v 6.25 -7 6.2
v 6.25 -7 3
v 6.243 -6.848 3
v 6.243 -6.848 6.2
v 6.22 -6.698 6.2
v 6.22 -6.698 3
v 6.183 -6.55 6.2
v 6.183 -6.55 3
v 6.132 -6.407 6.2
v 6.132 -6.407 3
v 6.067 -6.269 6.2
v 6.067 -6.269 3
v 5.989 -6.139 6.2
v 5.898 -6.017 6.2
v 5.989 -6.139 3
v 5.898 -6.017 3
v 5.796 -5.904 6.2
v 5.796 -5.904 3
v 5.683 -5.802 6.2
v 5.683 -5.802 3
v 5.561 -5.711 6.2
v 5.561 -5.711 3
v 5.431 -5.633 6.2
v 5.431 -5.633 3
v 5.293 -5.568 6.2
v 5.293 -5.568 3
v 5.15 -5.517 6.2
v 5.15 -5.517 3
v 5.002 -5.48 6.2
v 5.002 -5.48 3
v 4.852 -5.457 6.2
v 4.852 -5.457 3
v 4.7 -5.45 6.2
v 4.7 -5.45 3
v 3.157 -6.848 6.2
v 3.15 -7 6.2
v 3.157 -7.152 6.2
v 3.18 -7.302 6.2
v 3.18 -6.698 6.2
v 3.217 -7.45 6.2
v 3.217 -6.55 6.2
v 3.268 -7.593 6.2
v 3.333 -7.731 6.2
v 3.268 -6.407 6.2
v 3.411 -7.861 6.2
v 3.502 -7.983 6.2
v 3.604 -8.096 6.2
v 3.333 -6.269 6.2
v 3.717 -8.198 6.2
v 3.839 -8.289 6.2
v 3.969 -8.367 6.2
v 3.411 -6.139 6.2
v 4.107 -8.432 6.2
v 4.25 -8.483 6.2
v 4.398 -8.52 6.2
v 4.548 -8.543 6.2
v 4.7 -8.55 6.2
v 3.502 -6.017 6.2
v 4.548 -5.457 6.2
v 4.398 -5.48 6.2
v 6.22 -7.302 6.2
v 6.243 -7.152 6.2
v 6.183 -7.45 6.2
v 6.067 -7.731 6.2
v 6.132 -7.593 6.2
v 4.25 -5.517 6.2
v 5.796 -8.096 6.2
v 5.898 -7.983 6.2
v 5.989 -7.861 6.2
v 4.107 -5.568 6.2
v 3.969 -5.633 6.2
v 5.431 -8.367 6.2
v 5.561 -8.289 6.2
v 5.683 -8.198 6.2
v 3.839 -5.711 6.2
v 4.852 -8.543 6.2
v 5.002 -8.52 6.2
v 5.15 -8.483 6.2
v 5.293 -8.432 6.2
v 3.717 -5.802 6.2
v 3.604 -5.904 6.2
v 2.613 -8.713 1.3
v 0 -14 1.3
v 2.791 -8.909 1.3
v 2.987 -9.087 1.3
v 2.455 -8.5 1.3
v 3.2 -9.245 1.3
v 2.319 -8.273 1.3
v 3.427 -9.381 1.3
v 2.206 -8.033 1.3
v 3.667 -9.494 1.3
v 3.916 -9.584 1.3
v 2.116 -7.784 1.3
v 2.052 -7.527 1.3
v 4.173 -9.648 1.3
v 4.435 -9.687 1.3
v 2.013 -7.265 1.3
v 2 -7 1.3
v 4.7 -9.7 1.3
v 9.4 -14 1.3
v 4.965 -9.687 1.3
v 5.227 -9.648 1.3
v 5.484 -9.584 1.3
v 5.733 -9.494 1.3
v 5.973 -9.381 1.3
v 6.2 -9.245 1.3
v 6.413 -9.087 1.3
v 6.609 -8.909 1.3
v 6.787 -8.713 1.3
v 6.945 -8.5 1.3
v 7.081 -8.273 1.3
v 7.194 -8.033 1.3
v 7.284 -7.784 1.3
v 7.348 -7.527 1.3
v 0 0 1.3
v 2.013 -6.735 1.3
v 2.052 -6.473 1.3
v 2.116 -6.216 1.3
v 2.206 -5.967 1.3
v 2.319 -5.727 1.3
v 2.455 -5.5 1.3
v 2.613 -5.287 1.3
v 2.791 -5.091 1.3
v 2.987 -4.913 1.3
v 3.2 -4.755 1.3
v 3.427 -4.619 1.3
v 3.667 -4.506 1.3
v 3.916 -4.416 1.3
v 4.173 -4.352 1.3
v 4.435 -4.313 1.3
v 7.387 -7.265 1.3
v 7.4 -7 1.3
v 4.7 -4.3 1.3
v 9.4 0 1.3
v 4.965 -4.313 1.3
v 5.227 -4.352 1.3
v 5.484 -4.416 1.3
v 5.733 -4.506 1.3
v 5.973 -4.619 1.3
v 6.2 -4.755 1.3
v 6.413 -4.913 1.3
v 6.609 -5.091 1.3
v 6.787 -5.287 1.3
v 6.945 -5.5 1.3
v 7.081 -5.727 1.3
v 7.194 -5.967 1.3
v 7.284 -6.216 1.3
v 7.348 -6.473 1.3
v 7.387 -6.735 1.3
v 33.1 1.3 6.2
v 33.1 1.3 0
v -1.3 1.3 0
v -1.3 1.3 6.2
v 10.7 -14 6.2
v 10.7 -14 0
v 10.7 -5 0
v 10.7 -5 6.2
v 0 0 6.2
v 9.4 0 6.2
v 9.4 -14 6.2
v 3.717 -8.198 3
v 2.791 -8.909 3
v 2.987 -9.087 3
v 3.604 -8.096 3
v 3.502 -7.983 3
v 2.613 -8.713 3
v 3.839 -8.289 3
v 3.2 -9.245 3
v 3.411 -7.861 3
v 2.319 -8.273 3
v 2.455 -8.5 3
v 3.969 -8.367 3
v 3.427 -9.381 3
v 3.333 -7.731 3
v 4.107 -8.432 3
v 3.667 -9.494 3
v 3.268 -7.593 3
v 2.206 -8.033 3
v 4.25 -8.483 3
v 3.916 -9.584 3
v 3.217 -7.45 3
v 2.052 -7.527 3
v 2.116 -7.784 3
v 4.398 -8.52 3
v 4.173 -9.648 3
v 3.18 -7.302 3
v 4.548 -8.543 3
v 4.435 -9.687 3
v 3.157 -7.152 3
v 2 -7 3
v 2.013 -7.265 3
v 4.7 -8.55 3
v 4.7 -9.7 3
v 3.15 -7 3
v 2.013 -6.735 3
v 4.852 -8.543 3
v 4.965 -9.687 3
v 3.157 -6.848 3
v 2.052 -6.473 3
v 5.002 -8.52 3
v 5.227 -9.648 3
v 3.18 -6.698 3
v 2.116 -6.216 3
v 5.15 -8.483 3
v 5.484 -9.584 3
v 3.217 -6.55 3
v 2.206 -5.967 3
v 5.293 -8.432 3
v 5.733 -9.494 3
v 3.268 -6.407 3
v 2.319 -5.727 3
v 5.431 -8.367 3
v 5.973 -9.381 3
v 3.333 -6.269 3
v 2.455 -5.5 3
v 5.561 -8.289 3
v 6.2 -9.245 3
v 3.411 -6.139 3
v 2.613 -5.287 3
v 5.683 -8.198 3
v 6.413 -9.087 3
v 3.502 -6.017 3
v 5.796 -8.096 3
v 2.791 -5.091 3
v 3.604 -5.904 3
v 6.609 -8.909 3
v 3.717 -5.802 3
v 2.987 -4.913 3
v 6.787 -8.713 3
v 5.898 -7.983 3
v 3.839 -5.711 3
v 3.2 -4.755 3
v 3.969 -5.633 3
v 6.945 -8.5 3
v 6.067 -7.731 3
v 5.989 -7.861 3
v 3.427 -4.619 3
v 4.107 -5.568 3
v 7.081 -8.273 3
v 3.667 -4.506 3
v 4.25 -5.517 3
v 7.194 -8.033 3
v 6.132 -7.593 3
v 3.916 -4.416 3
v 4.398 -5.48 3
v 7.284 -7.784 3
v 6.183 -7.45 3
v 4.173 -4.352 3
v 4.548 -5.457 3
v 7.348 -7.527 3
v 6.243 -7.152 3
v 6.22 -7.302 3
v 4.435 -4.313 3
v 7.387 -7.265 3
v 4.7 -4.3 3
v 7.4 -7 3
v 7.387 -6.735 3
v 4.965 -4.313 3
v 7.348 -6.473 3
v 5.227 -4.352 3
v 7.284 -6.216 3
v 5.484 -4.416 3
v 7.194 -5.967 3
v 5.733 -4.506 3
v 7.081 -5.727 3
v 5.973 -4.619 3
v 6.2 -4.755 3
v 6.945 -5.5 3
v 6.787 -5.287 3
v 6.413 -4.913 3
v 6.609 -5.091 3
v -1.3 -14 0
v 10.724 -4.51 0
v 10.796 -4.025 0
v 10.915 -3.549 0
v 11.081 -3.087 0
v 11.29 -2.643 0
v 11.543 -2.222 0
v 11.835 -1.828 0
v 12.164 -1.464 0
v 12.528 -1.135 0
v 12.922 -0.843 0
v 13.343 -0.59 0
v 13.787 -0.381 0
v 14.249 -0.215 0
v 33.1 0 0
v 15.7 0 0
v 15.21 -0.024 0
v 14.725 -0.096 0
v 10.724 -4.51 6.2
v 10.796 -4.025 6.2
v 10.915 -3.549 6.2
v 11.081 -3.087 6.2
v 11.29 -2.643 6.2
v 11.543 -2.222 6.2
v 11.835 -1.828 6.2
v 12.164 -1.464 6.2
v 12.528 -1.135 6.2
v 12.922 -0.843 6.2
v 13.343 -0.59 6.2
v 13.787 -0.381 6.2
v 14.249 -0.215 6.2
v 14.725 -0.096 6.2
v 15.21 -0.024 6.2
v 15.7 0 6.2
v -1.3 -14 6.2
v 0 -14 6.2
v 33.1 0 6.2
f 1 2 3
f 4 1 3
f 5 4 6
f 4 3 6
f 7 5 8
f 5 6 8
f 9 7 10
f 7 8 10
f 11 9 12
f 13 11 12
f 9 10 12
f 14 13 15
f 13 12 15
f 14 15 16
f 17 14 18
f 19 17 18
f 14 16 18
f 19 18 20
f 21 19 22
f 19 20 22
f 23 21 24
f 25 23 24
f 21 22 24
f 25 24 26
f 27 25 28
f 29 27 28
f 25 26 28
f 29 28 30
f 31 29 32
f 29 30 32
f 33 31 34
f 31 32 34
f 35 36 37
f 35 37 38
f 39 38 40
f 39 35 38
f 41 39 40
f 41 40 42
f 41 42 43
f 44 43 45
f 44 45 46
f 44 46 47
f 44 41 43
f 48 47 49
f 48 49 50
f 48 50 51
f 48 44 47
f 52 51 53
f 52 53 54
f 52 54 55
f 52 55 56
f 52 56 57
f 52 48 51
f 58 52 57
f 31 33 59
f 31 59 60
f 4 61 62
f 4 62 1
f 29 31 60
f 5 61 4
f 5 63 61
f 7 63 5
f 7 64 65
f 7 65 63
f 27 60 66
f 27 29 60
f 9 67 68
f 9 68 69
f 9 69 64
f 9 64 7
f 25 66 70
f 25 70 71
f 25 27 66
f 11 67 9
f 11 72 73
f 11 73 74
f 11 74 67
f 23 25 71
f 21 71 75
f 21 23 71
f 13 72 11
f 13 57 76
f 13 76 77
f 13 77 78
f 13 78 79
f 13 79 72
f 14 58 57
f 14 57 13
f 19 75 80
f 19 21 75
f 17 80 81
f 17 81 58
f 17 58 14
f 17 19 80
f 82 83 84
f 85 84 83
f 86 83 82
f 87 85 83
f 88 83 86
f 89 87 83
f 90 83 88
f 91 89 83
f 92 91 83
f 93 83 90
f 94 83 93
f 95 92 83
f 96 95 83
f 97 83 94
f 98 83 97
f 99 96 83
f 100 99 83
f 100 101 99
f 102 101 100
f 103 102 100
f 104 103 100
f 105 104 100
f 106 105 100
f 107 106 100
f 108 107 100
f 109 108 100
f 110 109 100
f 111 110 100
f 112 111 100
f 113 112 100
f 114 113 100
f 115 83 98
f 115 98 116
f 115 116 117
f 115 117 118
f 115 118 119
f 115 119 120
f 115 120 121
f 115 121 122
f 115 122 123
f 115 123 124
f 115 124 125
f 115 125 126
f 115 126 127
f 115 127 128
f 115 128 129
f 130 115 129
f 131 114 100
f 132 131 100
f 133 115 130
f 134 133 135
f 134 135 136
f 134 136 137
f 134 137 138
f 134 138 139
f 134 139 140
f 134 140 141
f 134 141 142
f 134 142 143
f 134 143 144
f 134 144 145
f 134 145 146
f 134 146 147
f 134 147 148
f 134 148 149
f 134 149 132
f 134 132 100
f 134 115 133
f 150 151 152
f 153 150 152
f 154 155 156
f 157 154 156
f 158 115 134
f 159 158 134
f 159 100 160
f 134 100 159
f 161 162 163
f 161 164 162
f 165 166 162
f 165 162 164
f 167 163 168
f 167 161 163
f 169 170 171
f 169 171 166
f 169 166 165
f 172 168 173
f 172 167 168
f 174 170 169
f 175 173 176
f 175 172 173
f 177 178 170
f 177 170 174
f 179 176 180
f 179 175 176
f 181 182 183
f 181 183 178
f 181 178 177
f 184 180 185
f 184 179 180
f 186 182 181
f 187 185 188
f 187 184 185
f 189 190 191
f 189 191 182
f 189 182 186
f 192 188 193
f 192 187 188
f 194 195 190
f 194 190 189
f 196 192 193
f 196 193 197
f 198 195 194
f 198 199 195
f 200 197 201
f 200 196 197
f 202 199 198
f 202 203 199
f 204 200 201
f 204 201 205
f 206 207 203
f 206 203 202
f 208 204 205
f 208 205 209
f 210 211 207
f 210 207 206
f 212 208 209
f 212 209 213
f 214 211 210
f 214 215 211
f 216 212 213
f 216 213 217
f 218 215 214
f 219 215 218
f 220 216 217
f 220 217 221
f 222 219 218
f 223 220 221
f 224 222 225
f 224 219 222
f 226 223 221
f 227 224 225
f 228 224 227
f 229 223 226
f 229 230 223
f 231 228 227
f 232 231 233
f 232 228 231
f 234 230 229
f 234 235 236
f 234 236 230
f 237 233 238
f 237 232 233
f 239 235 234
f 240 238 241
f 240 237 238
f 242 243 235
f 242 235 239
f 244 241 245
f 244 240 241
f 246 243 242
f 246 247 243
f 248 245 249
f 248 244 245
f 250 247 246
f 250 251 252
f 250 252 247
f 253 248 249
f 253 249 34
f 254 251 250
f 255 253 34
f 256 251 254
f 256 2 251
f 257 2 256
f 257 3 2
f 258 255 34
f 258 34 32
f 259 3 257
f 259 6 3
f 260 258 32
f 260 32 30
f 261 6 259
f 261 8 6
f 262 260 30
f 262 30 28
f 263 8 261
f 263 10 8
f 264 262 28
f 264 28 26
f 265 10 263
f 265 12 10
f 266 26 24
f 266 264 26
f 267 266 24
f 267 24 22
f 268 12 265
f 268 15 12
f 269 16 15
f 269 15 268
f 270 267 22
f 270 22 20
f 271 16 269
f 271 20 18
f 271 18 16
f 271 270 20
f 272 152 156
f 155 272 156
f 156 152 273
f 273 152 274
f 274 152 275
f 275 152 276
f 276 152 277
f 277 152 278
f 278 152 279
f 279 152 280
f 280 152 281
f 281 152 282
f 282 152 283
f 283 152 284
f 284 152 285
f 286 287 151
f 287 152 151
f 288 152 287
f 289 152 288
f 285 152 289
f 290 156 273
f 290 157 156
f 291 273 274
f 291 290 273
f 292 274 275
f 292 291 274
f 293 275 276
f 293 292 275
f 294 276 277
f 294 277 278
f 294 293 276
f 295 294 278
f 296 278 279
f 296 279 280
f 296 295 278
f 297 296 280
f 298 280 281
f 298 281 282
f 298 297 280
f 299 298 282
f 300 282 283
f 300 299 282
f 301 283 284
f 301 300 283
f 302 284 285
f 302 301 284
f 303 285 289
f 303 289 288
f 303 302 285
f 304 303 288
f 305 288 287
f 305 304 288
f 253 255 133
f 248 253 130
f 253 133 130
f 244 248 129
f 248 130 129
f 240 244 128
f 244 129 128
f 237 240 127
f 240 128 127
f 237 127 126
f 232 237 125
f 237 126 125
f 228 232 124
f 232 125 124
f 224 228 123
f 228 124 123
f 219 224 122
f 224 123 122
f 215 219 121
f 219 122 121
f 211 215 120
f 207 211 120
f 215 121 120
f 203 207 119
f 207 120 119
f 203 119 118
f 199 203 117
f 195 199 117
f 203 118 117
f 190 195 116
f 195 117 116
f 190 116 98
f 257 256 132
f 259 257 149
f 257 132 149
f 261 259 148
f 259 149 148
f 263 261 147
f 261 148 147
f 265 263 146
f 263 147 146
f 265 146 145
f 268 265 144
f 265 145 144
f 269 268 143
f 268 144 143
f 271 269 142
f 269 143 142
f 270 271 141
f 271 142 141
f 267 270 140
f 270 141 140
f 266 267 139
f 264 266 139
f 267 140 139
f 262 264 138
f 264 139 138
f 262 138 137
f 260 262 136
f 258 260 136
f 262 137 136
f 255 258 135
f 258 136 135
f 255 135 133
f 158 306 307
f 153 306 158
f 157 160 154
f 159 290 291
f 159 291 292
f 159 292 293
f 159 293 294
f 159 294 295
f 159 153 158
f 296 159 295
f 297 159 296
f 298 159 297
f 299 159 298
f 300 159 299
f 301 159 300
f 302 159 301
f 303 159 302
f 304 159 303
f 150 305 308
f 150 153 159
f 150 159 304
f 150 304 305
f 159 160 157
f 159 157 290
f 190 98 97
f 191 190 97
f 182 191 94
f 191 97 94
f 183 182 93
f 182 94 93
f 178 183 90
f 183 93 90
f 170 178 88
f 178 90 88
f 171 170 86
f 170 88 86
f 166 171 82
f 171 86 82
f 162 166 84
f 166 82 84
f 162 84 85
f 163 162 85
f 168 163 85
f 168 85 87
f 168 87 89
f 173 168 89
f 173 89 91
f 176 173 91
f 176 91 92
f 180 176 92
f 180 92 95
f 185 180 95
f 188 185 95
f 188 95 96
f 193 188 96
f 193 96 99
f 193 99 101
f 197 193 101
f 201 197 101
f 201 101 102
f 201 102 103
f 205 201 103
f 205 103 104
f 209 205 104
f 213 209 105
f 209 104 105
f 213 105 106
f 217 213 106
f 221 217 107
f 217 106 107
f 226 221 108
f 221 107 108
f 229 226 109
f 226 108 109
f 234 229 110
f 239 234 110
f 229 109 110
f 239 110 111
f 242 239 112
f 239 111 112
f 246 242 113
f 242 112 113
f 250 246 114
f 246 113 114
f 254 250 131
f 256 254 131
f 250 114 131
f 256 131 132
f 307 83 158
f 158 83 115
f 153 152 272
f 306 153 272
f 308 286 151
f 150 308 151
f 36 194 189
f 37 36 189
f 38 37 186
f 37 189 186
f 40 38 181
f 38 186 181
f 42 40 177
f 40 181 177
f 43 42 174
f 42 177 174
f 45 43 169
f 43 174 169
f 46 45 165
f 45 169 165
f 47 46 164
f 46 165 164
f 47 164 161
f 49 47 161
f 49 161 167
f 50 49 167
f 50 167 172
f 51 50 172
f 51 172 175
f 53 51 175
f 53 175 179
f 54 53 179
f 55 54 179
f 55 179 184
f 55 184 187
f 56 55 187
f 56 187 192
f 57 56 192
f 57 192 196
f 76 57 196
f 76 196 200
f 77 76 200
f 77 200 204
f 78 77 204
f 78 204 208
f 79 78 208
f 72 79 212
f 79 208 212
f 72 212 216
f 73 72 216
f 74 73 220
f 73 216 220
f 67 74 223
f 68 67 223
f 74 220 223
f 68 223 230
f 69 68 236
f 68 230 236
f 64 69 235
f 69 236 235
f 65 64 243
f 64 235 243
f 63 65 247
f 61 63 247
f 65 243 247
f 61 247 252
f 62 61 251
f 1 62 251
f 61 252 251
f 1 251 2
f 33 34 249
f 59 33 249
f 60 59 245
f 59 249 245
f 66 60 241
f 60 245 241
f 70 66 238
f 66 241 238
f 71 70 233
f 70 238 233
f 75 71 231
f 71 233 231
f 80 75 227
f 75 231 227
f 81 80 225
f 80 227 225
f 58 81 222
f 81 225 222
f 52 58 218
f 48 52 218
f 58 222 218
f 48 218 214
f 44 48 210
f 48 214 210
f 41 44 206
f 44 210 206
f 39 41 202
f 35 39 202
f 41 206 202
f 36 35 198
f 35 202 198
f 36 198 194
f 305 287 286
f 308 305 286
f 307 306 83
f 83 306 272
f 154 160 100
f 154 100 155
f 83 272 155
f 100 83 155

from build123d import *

# Parameters (mm, degrees)
F1_DEPTH = 6.2
F0_W     = 1.3
F0_H     = 14
F2_DEPTH = 3
F3_DEPTH = 1.3
F4_R     = 5


with BuildPart() as f1:
    # F0 (on Top) → F1 (new body)
    with BuildSketch(Plane.XY):
        with BuildLine():
            ThreePointArc((6.25, -7), (5.7960155108, -5.9039844892), (4.7, -5.45))
            Line((4.7, -5.45), (4.7, -7))
            Line((4.7, -7), (3.15, -7))
            ThreePointArc((3.15, -7), (4.7, -8.55), (6.25, -7))
        make_face()
        with BuildLine():
            Line((4.7, -7), (4.7, -5.45))
            ThreePointArc((4.7, -5.45), (3.6039844892, -5.9039844892), (3.15, -7))
            Line((3.15, -7), (4.7, -7))
        make_face()
    extrude(amount=F1_DEPTH)

    # F0 (on Top) → F2 (join)
    with BuildSketch(Plane.XY):
        with BuildLine():
            ThreePointArc((7.4, -7), (6.6091883092, -5.0908116908), (4.7, -4.3))
            Line((4.7, -4.3), (4.7, -5.45))
            ThreePointArc((4.7, -5.45), (5.7960155108, -5.9039844892), (6.25, -7))
            ThreePointArc((6.25, -7), (4.7, -8.55), (3.15, -7))
            Line((3.15, -7), (2, -7))
            ThreePointArc((2, -7), (4.7, -9.7), (7.4, -7))
        make_face()
        with BuildLine():
            Line((4.7, -5.45), (4.7, -4.3))
            ThreePointArc((4.7, -4.3), (2.7908116908, -5.0908116908), (2, -7))
            Line((2, -7), (3.15, -7))
            ThreePointArc((3.15, -7), (3.6039844892, -5.9039844892), (4.7, -5.45))
        make_face()
    extrude(amount=F2_DEPTH)



with BuildPart() as f1b:
    # F0 (on Top) → F1, piece 2 (new body)
    with BuildSketch(Plane.XY):
        Polygon((0, -7), (0, 0), (-1.3, 0), (-1.3, -14), (0, -14), align=None)
        with Locations((10.05, -7)):
            Rectangle(F0_W, F0_H)
        Polygon((-1.3, 0), (0, 0), (4.7, 0), (9.4, 0), (10.7, 0), (33.1, 0), (33.1, 1.3), (-1.3, 1.3), align=None)
    extrude(amount=F1_DEPTH)


with BuildPart() as f1_1:
    add(f1.part)

    add(f1b.part)  # F3 merges F1b
    # F0 (on Top) → F3 (join)
    with BuildSketch(Plane.XY):
        with BuildLine():
            Line((9.4, 0), (4.7, 0))
            Line((4.7, 0), (4.7, -4.3))
            ThreePointArc((4.7, -4.3), (6.6091883092, -5.0908116908), (7.4, -7))
            ThreePointArc((7.4, -7), (4.7, -9.7), (2, -7))
            Line((2, -7), (0, -7))
            Line((0, -7), (0, -14))
            Line((0, -14), (9.4, -14))
            Line((9.4, -14), (9.4, 0))
        make_face()
        with BuildLine():
            Line((4.7, 0), (0, 0))
            Line((0, 0), (0, -7))
            Line((0, -7), (2, -7))
            ThreePointArc((2, -7), (2.7908116908, -5.0908116908), (4.7, -4.3))
            Line((4.7, -4.3), (4.7, 0))
        make_face()
    extrude(amount=F3_DEPTH)

    # F4
    f4_edges = [f1_1.edges().sort_by_distance(p)[0] for p in [
        (10.7, 0, 3.1),
    ]]
    fillet(f4_edges, radius=F4_R)


solid = f1_1.part
